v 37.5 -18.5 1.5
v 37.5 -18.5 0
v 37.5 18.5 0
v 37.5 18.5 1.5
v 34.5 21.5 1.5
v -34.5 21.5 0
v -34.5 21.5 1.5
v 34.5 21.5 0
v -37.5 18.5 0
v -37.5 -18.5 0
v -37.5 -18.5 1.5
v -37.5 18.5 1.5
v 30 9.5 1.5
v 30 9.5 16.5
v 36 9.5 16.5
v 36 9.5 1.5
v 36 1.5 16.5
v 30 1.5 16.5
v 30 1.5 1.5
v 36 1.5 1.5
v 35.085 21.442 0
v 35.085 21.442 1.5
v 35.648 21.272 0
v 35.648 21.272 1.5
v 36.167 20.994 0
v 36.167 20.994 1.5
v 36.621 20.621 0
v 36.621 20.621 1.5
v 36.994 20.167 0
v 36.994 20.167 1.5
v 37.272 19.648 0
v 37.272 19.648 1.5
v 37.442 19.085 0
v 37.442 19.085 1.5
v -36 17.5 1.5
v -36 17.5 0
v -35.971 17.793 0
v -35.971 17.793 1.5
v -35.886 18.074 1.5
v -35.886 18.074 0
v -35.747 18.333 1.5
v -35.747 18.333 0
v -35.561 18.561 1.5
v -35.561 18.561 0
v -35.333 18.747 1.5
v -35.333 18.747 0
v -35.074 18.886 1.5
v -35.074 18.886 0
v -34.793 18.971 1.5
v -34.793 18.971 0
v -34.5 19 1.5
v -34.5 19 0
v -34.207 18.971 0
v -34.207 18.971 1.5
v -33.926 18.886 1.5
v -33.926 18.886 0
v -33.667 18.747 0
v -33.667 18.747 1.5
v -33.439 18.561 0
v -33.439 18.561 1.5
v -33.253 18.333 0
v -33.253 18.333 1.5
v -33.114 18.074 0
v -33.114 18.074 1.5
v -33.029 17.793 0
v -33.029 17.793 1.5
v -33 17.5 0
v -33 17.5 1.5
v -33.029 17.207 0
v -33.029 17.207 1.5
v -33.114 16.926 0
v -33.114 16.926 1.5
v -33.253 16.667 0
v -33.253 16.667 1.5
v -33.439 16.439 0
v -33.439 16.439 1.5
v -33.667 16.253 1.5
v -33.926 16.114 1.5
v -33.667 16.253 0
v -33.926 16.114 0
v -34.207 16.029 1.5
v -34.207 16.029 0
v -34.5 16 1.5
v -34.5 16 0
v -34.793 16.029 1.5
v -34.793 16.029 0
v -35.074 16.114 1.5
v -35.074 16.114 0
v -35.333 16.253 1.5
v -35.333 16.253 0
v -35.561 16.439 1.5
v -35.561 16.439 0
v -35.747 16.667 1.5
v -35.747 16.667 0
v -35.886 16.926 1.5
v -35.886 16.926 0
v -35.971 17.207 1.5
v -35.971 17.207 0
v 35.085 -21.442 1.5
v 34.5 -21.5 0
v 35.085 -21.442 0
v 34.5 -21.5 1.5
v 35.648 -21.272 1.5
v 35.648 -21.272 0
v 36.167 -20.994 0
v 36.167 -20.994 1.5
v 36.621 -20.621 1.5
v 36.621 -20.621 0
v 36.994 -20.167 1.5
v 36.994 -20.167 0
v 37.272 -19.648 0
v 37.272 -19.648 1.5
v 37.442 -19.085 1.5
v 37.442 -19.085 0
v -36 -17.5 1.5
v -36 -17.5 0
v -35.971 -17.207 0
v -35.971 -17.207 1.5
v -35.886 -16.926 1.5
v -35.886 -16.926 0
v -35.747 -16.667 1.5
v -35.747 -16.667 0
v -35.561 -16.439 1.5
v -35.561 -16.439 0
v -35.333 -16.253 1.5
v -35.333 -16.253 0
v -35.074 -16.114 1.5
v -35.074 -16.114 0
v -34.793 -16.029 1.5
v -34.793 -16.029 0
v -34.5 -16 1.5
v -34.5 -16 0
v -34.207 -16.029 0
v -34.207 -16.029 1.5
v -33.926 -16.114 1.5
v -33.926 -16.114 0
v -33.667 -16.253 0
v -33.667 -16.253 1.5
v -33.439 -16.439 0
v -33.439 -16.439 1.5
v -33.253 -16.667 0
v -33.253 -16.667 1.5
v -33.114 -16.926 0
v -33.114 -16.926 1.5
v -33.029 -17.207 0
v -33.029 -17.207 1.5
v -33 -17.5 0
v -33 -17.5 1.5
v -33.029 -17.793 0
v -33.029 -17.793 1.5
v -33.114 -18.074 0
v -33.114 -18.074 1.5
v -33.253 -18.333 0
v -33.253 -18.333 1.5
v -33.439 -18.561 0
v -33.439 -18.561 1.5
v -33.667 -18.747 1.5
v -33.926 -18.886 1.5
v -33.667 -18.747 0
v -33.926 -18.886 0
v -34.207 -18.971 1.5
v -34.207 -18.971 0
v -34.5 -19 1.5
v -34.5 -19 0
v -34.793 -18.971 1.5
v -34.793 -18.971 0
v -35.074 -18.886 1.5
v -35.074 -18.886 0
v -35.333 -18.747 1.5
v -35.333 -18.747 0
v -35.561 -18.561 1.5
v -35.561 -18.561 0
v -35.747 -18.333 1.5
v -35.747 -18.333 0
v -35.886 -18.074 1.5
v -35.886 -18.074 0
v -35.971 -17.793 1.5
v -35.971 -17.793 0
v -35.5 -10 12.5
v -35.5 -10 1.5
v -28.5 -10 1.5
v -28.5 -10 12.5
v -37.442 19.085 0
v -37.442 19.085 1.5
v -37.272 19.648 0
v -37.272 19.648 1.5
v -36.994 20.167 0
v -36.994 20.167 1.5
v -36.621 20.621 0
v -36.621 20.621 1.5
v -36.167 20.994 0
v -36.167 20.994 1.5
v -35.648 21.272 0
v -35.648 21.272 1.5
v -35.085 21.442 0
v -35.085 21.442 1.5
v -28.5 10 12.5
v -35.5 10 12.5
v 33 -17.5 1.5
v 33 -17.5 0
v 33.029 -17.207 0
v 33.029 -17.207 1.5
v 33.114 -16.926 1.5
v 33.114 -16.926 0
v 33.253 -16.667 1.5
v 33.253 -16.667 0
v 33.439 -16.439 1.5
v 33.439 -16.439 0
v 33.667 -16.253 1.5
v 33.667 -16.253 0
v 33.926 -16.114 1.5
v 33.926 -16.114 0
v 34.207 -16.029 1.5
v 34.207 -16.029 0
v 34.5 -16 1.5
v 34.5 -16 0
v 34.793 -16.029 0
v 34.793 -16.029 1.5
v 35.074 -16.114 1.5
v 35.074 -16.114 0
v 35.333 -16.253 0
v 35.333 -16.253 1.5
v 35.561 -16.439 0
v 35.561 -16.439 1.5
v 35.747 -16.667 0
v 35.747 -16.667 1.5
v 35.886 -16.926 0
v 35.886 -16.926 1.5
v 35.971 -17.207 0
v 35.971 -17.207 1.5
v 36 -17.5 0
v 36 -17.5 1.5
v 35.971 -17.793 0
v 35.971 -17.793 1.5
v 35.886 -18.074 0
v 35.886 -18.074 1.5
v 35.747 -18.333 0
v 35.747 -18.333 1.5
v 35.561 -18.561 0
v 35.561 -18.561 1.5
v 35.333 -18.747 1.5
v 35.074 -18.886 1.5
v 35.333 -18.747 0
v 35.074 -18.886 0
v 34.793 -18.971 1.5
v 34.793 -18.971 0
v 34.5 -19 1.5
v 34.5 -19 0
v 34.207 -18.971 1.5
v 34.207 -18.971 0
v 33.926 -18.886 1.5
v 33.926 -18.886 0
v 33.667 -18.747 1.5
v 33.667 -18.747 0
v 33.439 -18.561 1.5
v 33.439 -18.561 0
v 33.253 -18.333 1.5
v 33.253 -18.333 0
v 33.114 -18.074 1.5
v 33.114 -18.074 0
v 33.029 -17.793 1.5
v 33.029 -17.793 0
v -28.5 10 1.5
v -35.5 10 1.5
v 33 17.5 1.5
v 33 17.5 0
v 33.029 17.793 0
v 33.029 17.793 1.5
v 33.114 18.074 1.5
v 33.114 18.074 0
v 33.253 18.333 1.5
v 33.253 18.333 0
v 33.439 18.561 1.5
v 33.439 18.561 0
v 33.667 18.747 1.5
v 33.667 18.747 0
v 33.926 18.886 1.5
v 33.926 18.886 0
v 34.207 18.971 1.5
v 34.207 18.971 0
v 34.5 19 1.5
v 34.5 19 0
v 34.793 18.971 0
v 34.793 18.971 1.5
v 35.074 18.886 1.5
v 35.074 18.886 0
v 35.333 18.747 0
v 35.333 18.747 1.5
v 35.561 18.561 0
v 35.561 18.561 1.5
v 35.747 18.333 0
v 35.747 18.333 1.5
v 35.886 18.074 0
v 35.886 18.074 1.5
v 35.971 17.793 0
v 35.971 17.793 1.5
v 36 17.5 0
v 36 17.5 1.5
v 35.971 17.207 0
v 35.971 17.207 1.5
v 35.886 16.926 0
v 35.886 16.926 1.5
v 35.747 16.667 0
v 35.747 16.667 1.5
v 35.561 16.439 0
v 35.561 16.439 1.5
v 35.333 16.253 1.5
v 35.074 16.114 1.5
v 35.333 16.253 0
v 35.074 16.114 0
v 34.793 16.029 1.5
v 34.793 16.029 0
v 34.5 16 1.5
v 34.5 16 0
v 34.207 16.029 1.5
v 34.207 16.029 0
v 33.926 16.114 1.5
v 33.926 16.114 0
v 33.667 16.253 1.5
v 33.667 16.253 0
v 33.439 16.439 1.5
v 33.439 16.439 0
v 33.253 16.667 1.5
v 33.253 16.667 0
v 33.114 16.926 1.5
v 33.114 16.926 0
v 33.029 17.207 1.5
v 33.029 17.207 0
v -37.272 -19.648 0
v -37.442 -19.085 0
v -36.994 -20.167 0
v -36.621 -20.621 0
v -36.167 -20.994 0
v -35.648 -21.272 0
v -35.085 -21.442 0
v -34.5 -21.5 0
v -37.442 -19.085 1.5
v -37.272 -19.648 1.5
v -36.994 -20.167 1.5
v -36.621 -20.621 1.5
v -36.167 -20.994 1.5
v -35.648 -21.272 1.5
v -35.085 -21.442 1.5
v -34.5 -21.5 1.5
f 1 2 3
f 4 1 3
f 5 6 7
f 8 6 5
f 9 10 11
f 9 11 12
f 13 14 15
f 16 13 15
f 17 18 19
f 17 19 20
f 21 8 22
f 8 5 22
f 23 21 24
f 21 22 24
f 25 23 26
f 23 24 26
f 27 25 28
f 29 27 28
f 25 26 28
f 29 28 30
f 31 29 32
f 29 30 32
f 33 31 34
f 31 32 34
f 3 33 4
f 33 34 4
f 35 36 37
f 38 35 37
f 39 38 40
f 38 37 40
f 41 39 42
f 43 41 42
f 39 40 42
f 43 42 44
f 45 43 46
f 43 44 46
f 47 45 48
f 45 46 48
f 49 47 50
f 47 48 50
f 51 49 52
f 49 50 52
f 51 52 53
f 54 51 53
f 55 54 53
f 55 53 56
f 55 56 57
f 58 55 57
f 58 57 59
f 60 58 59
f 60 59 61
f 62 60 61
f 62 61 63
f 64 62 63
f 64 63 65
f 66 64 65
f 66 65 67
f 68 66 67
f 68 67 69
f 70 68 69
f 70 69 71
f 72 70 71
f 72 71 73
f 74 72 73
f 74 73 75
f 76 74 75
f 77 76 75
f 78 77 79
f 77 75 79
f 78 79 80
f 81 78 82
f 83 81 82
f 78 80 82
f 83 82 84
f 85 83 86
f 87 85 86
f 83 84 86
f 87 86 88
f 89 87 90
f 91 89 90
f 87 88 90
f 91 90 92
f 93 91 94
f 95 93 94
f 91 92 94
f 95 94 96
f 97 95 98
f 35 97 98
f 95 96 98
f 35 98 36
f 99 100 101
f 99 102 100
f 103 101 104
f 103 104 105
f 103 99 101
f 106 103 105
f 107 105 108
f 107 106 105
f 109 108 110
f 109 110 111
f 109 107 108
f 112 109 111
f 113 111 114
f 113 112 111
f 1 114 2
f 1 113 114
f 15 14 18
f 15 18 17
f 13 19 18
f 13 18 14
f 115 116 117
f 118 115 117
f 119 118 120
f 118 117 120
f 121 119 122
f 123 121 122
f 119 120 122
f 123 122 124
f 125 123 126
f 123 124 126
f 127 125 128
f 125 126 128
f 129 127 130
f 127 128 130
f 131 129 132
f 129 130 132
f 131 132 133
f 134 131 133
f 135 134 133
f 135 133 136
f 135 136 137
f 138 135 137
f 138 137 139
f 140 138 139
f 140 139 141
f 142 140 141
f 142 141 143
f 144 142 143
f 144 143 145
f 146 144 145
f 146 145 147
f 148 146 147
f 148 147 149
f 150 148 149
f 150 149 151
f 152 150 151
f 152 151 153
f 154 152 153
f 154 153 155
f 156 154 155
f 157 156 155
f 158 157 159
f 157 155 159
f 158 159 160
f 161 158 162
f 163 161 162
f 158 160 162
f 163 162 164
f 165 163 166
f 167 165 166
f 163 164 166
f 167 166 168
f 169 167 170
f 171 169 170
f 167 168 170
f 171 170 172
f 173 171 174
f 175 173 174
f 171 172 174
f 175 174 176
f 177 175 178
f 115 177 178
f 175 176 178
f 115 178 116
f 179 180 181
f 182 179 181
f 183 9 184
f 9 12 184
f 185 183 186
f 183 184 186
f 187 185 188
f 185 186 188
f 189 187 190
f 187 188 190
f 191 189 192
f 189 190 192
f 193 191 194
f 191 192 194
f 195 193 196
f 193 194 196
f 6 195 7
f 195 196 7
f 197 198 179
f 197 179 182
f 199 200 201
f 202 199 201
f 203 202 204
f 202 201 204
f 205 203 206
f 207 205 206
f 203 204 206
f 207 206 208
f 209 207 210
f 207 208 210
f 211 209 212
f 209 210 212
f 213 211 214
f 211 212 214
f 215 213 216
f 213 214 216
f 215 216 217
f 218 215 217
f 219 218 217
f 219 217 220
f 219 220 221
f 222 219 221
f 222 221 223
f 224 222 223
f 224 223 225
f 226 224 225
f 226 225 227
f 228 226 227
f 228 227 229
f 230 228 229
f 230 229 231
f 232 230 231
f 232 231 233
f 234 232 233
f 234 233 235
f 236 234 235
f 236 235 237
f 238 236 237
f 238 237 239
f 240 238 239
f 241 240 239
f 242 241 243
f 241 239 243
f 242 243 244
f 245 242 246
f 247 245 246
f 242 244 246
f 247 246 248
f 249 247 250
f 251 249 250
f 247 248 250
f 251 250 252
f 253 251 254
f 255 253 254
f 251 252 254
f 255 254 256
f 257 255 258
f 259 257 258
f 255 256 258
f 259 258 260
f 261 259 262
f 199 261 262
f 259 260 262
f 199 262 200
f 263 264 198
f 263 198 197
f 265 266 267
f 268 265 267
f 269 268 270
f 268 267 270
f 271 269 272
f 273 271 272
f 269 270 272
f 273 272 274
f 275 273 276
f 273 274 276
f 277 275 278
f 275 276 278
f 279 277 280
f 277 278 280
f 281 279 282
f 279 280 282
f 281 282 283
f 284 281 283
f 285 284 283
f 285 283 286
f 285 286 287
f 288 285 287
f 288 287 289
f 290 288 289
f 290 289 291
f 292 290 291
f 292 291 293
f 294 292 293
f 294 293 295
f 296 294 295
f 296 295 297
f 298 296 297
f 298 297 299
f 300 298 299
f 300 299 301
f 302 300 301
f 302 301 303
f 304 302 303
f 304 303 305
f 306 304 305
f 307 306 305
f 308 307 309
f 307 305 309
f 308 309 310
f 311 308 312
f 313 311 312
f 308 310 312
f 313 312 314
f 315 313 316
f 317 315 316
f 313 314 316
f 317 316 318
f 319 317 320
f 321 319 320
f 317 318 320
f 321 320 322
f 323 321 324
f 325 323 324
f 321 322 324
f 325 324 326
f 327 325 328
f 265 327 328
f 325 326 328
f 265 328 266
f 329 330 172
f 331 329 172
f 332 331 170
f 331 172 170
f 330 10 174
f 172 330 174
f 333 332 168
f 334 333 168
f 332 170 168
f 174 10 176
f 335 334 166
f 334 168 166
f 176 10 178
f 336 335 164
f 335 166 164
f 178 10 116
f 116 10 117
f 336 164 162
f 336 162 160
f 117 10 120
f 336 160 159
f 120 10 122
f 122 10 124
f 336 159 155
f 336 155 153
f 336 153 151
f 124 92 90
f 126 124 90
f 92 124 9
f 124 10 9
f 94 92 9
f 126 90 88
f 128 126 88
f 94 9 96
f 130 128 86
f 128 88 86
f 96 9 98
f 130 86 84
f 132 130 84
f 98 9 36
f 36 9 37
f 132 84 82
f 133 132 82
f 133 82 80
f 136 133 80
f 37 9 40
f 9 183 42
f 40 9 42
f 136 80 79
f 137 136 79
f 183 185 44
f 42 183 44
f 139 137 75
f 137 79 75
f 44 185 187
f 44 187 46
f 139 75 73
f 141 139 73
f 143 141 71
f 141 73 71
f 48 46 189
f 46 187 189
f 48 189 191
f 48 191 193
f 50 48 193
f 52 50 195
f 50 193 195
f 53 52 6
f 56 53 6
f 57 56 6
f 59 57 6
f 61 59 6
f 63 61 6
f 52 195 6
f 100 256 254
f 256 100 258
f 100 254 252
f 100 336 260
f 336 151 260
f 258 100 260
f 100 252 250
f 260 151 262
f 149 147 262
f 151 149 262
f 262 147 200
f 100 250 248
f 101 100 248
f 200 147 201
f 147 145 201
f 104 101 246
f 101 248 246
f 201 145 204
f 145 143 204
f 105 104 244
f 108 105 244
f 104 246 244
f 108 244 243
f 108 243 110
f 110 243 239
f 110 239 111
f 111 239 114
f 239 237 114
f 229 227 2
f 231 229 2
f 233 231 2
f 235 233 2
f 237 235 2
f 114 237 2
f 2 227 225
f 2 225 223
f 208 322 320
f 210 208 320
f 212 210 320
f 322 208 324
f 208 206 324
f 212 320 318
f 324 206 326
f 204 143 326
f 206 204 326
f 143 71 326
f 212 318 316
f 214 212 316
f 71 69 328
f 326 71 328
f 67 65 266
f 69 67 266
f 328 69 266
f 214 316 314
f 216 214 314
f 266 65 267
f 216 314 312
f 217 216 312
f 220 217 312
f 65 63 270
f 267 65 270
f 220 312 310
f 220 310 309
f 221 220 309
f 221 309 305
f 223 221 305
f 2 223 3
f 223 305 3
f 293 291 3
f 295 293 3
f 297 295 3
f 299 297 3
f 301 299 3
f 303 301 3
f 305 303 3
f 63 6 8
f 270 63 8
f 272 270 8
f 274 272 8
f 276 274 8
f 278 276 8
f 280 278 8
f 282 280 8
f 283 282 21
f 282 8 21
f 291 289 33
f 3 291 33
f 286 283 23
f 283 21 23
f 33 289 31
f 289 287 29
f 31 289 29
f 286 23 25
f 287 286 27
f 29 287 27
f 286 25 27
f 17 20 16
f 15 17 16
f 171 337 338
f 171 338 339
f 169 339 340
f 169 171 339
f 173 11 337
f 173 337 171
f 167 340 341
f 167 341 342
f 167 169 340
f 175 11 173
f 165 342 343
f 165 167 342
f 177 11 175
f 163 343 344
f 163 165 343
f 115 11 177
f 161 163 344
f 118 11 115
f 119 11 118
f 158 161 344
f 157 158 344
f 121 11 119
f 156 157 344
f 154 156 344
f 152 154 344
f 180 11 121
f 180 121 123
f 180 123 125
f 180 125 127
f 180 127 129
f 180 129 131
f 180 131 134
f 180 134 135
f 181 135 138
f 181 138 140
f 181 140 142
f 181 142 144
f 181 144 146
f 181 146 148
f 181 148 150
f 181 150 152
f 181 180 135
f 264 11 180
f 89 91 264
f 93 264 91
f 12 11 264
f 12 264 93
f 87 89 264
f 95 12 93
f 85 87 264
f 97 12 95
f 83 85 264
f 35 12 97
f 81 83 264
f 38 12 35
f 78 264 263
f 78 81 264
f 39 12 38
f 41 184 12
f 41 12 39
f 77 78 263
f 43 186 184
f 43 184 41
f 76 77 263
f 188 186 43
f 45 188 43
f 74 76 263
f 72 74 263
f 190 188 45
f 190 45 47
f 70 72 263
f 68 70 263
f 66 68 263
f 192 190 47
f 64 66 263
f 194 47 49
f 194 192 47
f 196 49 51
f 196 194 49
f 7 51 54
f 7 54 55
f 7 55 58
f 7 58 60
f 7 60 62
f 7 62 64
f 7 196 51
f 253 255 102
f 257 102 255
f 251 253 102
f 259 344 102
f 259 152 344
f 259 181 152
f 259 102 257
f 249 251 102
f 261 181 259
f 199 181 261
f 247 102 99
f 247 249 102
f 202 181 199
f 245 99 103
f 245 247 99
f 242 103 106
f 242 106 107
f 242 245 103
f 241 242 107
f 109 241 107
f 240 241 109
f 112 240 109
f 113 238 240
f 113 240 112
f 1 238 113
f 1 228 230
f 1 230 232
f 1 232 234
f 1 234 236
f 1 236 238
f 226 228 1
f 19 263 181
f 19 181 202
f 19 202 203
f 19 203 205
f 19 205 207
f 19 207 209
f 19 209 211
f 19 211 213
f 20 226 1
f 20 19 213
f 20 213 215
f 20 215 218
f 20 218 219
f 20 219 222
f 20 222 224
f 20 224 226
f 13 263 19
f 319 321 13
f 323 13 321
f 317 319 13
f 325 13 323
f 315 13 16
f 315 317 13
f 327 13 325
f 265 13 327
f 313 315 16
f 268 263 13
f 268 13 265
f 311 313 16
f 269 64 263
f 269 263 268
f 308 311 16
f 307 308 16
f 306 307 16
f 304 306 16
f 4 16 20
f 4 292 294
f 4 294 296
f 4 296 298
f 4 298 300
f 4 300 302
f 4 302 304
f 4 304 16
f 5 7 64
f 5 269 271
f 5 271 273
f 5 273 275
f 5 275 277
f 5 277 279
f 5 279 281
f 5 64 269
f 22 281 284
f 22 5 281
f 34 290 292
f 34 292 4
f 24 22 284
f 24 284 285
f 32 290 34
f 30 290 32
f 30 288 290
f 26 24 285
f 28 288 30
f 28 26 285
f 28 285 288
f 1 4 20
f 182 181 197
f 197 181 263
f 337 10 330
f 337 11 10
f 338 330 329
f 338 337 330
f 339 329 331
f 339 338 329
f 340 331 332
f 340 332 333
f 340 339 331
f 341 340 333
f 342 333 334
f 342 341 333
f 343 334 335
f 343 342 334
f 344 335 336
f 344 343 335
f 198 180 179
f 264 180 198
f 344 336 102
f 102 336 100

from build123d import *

# Parameters (mm, degrees)
F0_W     = 75
F0_H     = 43
F1_DEPTH = 1.5
F3_D     = 3
F4_R     = 3
F5_W     = 7
F5_H     = 20
F6_DEPTH = 11
F7_W     = 6
F7_H     = 8
F8_DEPTH = 15


with BuildPart() as f1:
    # F0 (on Top) → F1 (new body)
    with BuildSketch(Plane.XY):
        Rectangle(F0_W, F0_H)
    extrude(amount=F1_DEPTH)

    # F3 (through all)
    with Locations(Plane.XY.offset(1.5)):
        with Locations((-34.5, 17.5), (34.5, 17.5), (34.5, -17.5), (-34.5, -17.5)):
            Hole(F3_D / 2)

    # F4
    f4_edges = [f1.edges().sort_by_distance(p)[0] for p in [
        (-37.5, -21.5, 0.75),
        (37.5, -21.5, 0.75),
        (-37.5, 21.5, 0.75),
        (37.5, 21.5, 0.75),
    ]]
    fillet(f4_edges, radius=F4_R)

    # F5 (on face) → F6 (join)
    with BuildSketch(Plane.XY.offset(1.5)):
        with Locations((-32, 0)):
            Rectangle(F5_W, F5_H)
    extrude(amount=F6_DEPTH)

    # F7 (on face) → F8 (join)
    with BuildSketch(Plane.XY.offset(1.5)):
        with Locations((33, 5.5)):
            Rectangle(F7_W, F7_H)
    extrude(amount=F8_DEPTH)


solid = f1.part
